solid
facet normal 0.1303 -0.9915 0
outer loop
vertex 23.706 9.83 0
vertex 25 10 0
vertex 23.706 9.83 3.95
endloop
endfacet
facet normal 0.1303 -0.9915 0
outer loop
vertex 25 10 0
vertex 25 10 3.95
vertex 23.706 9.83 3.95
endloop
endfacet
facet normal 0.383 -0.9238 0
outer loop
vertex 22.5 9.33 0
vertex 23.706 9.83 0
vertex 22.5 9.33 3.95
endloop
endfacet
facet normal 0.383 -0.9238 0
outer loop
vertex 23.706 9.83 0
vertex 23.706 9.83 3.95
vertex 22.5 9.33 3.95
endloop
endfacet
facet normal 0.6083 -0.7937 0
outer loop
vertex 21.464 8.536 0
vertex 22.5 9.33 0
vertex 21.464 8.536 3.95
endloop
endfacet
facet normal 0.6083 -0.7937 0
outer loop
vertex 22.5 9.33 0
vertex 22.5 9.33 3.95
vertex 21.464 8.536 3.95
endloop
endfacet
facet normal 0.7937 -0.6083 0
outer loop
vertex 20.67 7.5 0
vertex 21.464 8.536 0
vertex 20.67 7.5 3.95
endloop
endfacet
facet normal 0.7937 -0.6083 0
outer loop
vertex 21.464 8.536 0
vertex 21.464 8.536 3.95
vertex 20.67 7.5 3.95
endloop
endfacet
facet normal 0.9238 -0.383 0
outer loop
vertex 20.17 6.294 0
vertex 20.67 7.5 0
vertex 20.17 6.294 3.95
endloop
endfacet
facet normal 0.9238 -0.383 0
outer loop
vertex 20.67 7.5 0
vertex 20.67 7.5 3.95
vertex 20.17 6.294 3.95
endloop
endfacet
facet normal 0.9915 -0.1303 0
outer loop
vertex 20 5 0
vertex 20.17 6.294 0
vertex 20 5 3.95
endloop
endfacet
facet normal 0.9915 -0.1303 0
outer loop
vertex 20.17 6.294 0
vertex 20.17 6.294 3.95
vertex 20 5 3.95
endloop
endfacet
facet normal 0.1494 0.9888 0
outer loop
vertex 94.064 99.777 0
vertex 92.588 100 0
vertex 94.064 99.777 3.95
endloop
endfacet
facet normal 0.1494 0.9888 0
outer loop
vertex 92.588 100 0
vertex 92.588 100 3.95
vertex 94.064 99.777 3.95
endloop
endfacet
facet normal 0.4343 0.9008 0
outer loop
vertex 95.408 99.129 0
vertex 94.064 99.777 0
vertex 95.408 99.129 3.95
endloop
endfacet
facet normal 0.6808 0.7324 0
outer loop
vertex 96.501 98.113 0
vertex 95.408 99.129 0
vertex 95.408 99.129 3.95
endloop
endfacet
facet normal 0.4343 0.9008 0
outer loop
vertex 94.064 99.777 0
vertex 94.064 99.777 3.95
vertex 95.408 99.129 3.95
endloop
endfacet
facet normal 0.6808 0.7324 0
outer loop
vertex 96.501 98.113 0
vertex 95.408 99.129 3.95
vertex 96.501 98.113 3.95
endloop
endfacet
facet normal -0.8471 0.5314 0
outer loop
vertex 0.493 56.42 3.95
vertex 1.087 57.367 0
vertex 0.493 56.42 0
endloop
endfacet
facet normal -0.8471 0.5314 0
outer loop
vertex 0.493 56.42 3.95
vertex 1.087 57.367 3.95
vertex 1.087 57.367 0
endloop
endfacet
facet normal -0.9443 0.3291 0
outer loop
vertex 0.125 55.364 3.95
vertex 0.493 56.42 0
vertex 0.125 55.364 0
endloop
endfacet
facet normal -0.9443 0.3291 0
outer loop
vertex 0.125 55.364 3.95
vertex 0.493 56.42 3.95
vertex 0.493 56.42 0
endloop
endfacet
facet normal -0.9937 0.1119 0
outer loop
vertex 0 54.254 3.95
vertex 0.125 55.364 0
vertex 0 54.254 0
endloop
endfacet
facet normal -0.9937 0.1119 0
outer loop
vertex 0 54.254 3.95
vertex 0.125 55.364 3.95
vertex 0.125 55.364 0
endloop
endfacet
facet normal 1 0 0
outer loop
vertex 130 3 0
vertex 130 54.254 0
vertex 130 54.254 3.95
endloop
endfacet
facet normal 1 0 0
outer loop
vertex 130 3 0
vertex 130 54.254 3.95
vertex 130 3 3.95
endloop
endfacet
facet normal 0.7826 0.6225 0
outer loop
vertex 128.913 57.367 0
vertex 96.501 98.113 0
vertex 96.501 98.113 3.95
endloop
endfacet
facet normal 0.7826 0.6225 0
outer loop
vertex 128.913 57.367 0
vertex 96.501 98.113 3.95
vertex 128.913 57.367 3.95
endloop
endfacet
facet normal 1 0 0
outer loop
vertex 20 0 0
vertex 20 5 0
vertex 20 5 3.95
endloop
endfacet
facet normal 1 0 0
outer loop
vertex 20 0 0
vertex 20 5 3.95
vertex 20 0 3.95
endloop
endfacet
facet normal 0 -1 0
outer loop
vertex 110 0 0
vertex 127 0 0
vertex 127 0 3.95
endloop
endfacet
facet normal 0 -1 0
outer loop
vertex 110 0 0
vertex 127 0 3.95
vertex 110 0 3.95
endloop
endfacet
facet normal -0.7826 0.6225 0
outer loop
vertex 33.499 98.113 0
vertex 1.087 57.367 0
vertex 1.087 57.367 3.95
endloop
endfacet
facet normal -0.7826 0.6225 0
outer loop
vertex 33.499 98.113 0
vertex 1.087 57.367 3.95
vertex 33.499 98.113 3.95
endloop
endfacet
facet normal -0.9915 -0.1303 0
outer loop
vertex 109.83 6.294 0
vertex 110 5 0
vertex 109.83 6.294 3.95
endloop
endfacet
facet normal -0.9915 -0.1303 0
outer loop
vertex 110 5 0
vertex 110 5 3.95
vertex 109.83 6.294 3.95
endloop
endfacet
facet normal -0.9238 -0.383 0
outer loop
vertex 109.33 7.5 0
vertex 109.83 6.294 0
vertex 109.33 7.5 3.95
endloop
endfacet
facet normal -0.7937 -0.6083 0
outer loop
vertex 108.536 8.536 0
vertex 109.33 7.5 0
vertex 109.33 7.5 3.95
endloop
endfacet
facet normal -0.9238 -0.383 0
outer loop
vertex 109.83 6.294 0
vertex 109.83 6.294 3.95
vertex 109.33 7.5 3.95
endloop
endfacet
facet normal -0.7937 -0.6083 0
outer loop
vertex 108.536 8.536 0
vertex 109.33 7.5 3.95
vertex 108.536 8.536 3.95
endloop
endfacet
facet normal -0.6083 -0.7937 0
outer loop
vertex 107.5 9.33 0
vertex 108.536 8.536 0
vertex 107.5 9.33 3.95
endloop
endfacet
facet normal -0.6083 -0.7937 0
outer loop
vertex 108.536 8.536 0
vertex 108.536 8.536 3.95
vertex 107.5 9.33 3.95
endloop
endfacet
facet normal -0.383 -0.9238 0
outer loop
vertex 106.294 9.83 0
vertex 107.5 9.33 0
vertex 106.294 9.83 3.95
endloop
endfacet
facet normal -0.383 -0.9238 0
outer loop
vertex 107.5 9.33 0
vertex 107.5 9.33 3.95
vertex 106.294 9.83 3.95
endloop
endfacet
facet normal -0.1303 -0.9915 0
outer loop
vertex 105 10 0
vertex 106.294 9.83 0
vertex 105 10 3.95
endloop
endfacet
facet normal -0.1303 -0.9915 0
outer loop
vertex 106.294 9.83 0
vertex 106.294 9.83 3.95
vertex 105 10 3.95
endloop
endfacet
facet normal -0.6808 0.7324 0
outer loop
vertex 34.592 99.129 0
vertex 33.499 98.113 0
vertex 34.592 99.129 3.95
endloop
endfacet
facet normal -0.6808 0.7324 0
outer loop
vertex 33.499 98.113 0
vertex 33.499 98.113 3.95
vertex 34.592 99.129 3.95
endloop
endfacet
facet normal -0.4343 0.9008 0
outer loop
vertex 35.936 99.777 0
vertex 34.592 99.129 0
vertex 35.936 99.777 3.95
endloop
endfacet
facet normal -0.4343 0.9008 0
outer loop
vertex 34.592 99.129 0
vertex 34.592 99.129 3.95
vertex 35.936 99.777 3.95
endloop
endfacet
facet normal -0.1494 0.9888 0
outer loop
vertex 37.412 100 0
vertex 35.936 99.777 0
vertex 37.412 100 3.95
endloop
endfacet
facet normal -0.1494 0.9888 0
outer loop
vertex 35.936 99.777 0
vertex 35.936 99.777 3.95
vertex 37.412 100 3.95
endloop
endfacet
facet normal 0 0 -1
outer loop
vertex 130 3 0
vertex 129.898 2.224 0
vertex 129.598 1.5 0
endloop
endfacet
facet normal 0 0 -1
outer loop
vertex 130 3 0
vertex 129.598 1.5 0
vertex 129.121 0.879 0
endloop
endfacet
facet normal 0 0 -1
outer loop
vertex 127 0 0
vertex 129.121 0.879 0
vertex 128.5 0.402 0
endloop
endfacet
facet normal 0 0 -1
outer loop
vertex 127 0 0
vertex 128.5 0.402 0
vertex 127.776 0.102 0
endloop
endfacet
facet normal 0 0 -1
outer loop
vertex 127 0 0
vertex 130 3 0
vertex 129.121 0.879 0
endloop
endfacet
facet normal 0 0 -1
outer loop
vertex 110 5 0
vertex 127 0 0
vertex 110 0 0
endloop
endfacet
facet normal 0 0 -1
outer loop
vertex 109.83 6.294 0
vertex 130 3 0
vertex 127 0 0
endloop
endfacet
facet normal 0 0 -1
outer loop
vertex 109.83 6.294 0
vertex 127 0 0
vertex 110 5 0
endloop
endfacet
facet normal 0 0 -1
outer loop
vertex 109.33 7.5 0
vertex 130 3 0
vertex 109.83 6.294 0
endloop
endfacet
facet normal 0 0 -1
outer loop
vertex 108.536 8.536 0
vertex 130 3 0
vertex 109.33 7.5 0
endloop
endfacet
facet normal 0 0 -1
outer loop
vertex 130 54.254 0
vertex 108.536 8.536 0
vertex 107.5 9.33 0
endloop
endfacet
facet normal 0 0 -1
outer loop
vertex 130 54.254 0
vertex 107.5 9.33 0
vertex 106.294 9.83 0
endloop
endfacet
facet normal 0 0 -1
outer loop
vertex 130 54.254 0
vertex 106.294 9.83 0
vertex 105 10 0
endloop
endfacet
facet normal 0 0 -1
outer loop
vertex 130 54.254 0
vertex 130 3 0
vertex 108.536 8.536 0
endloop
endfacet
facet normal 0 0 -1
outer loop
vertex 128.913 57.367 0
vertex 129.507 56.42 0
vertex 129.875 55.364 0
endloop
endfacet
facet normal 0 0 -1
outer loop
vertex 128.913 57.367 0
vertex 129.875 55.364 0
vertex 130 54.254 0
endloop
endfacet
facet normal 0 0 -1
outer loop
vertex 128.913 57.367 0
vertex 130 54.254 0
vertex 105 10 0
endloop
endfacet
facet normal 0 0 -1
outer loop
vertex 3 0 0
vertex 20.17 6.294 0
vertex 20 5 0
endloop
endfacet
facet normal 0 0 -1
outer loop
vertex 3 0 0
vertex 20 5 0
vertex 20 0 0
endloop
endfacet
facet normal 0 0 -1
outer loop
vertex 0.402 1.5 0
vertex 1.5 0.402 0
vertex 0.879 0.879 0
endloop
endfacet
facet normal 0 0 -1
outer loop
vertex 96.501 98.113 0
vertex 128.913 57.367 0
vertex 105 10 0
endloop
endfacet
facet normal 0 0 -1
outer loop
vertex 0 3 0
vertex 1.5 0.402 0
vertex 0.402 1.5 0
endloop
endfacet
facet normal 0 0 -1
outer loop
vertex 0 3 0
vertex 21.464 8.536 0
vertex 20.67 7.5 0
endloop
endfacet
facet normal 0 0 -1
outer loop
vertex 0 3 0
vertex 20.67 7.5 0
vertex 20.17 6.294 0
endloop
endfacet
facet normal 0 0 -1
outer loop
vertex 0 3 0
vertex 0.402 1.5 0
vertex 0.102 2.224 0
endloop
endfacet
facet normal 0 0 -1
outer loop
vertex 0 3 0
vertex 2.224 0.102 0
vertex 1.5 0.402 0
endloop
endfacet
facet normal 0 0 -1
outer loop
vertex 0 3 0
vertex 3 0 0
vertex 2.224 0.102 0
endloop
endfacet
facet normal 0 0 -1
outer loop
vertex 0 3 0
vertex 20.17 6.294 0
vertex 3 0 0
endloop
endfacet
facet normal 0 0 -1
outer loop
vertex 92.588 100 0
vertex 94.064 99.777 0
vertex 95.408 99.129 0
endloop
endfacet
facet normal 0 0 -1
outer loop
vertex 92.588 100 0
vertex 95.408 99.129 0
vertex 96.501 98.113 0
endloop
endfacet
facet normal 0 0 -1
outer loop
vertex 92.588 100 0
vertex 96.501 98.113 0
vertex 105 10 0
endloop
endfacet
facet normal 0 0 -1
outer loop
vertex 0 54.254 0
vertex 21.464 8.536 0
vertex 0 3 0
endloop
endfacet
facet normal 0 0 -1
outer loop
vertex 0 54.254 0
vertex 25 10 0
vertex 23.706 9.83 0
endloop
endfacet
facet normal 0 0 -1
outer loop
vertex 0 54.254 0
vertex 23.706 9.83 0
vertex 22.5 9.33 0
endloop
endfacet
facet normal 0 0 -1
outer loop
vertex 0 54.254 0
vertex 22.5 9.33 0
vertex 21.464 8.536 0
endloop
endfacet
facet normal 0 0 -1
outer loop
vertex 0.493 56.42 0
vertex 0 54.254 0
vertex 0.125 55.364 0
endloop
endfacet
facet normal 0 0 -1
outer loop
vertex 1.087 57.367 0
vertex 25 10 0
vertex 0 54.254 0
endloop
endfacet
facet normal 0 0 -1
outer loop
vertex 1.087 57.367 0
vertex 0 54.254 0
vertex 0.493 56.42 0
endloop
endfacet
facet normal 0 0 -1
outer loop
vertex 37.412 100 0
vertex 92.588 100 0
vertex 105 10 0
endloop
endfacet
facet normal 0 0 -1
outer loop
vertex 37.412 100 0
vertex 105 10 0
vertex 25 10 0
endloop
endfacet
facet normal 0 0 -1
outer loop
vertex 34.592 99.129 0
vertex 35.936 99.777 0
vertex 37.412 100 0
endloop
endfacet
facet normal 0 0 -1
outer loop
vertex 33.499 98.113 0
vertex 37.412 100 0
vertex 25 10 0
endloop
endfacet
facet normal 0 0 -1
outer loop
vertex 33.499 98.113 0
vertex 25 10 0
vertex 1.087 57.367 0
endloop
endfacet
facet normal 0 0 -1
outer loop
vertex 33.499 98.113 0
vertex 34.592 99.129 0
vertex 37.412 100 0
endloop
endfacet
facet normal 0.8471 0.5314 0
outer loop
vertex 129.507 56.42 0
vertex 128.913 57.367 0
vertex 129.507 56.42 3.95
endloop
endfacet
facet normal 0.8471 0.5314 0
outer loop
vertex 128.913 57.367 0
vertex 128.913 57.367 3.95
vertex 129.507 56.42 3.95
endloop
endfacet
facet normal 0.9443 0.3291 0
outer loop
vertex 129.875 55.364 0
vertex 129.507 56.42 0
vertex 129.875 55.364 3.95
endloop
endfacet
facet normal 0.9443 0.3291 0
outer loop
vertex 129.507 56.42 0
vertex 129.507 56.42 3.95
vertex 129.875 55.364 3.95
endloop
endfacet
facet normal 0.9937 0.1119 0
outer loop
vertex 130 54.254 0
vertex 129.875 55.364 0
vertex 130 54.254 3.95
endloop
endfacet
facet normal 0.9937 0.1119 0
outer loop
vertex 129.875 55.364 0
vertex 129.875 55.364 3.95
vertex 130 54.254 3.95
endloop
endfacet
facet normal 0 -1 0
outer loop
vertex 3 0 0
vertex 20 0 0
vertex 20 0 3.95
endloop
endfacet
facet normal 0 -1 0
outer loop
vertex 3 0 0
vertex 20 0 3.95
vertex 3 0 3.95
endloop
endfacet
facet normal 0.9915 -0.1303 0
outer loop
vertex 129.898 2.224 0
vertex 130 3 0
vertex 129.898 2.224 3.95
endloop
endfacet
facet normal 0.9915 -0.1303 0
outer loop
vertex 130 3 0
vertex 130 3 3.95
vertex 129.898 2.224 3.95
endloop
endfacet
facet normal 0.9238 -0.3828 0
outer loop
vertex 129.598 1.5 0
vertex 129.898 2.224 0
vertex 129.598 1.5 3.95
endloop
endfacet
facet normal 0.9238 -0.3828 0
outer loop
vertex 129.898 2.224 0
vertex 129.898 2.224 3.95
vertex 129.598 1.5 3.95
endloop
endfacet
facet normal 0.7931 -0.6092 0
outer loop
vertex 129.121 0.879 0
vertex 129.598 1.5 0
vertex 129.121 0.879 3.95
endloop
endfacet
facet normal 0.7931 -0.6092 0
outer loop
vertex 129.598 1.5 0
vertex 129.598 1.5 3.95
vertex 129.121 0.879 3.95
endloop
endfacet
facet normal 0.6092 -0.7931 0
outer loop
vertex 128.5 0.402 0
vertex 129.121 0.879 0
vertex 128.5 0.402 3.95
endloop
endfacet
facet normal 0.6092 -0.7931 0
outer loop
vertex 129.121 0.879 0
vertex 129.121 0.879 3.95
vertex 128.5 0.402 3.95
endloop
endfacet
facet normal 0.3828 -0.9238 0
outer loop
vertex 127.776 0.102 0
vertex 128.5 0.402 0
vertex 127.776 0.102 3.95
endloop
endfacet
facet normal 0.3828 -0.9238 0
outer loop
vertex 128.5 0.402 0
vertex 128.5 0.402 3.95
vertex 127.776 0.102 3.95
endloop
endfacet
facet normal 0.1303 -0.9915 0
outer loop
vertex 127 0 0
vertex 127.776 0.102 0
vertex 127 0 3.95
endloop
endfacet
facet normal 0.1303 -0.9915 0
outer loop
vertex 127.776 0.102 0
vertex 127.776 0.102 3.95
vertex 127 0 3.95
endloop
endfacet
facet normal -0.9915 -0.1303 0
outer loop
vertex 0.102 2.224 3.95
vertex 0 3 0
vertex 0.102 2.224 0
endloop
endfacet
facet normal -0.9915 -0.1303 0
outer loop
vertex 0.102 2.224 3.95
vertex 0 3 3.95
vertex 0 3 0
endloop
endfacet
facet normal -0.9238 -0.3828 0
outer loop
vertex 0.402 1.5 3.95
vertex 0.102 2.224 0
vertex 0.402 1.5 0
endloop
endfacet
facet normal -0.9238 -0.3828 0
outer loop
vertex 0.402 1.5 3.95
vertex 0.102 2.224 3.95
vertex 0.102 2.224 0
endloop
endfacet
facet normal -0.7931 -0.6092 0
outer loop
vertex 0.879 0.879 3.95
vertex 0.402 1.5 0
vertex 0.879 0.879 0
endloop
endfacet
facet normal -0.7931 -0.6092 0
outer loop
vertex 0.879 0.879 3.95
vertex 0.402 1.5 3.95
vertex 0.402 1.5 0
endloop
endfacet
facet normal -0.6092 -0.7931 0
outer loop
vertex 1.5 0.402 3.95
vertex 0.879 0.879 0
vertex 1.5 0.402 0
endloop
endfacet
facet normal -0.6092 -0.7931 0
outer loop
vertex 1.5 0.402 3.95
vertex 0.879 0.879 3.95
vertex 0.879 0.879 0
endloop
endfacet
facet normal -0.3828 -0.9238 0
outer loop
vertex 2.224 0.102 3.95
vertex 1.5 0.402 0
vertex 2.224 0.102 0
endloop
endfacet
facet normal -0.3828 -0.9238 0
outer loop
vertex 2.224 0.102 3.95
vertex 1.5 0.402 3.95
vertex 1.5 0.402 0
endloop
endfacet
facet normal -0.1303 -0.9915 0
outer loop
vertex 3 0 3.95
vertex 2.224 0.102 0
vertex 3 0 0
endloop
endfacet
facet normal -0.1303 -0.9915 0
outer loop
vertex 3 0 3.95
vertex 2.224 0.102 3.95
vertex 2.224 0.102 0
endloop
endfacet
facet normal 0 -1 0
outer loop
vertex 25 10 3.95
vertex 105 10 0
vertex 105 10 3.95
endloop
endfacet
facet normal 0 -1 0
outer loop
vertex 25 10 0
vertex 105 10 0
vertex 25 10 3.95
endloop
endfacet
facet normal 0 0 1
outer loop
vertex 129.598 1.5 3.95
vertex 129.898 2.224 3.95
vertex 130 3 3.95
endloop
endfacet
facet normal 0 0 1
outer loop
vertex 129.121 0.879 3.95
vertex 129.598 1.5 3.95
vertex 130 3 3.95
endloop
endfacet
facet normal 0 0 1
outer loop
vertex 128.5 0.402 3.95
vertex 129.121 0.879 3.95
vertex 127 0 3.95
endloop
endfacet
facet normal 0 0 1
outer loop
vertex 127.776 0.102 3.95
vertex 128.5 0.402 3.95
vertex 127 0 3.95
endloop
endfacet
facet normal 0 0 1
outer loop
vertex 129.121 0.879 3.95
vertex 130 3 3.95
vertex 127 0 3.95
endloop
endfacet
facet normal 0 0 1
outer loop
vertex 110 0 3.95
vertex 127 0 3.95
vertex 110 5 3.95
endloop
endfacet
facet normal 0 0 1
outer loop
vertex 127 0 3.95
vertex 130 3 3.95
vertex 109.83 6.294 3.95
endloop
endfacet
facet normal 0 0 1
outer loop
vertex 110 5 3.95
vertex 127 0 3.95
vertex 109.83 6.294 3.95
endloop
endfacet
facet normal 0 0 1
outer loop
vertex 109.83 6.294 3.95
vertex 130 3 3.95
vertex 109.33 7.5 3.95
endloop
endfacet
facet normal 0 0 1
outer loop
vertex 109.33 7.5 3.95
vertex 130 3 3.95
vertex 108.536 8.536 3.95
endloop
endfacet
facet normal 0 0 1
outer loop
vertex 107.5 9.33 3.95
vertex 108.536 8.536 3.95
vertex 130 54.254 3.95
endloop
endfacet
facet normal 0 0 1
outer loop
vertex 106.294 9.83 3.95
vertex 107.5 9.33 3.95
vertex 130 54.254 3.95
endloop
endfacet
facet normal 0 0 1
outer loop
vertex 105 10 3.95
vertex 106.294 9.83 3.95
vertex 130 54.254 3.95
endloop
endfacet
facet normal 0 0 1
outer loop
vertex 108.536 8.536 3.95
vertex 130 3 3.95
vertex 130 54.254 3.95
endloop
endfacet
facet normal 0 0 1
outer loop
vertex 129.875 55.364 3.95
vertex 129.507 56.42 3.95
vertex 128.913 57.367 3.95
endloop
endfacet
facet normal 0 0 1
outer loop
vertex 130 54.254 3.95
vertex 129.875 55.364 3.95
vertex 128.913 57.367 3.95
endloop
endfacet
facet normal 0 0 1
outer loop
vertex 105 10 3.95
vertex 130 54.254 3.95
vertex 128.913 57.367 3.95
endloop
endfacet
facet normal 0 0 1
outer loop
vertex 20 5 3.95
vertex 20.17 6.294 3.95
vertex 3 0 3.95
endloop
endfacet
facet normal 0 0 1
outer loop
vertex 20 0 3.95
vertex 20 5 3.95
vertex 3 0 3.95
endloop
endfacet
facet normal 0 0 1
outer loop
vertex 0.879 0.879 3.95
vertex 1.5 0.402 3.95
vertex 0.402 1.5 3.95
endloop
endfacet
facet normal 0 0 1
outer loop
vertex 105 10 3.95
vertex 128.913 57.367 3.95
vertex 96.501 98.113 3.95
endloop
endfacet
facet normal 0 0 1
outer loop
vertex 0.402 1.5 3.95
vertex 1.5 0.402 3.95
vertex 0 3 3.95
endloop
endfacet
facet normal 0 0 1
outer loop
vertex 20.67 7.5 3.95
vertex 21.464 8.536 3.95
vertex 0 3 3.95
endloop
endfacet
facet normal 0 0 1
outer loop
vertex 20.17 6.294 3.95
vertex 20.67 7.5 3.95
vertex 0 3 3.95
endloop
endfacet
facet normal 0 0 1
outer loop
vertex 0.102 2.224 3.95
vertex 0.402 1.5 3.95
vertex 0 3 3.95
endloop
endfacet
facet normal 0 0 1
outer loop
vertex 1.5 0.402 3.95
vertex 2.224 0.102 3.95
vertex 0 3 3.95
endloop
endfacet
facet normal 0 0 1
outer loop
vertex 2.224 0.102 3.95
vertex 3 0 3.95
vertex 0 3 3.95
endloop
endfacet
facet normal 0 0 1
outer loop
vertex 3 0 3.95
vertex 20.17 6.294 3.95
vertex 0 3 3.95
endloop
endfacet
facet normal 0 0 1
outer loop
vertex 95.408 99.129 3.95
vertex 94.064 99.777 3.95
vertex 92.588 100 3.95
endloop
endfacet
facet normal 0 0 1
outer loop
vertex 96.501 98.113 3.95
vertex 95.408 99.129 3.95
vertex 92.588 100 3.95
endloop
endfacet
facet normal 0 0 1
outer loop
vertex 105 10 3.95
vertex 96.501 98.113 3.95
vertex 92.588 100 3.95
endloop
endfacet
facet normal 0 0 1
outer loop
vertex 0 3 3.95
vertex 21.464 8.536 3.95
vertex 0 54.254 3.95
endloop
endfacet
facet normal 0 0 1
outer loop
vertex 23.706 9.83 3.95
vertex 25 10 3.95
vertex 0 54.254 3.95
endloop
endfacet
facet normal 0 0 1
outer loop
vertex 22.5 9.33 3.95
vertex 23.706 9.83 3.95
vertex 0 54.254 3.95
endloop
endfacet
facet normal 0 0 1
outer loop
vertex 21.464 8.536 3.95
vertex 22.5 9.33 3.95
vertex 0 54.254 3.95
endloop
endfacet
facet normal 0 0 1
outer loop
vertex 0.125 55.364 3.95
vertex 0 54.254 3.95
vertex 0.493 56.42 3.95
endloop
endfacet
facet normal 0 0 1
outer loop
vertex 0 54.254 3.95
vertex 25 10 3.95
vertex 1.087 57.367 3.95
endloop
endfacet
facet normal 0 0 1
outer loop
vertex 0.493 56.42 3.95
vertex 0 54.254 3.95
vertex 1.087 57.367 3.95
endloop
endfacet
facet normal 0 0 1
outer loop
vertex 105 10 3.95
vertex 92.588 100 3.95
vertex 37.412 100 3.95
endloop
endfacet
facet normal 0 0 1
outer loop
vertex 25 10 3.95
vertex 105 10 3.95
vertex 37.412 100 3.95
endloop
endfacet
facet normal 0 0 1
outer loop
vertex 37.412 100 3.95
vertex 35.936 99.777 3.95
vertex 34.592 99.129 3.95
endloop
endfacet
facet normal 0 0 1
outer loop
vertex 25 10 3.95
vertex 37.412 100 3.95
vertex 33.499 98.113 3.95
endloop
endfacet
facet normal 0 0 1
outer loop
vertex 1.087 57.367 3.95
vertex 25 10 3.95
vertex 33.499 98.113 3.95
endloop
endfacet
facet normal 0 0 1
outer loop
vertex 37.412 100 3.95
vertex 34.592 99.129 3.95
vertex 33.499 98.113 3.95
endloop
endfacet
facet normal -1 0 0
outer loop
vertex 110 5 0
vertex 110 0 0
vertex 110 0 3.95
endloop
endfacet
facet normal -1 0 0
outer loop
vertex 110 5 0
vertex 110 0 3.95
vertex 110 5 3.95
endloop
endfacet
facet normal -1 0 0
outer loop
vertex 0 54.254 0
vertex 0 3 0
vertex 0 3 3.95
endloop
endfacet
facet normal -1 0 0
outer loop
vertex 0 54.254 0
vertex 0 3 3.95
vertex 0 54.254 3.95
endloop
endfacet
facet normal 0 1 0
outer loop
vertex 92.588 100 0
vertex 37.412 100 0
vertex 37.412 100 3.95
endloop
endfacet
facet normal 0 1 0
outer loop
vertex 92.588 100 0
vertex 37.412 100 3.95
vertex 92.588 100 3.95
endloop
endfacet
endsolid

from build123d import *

# Parameters (mm, degrees)
BOSS_EXTRUDE2_DEPTH = 3.95
FILLET1_R           = 5
FILLET2_R           = 3


with BuildPart() as part:
    # Sketch1 → Boss-Extrude2 (new body)
    with BuildSketch(Plane.XY):
        Polygon((0, 56), (35, 100), (95, 100), (130, 56), (130, 0), (110, 0), (110, 10), (20, 10), (20, 0), (0, 0), align=None)
    extrude(amount=BOSS_EXTRUDE2_DEPTH)

    # Fillet1
    fillet1_edges = [part.edges().sort_by_distance(p)[0] for p in [
        (110, 10, 1.975),
        (20, 10, 1.975),
        (0, 56, 1.975),
        (35, 100, 1.975),
        (95, 100, 1.975),
        (130, 56, 1.975),
    ]]
    fillet(fillet1_edges, radius=FILLET1_R)

    # Fillet2
    fillet2_edges = [part.edges().sort_by_distance(p)[0] for p in [
        (0, 0, 1.975),
        (130, 0, 1.975),
    ]]
    fillet(fillet2_edges, radius=FILLET2_R)


solid = part.part
